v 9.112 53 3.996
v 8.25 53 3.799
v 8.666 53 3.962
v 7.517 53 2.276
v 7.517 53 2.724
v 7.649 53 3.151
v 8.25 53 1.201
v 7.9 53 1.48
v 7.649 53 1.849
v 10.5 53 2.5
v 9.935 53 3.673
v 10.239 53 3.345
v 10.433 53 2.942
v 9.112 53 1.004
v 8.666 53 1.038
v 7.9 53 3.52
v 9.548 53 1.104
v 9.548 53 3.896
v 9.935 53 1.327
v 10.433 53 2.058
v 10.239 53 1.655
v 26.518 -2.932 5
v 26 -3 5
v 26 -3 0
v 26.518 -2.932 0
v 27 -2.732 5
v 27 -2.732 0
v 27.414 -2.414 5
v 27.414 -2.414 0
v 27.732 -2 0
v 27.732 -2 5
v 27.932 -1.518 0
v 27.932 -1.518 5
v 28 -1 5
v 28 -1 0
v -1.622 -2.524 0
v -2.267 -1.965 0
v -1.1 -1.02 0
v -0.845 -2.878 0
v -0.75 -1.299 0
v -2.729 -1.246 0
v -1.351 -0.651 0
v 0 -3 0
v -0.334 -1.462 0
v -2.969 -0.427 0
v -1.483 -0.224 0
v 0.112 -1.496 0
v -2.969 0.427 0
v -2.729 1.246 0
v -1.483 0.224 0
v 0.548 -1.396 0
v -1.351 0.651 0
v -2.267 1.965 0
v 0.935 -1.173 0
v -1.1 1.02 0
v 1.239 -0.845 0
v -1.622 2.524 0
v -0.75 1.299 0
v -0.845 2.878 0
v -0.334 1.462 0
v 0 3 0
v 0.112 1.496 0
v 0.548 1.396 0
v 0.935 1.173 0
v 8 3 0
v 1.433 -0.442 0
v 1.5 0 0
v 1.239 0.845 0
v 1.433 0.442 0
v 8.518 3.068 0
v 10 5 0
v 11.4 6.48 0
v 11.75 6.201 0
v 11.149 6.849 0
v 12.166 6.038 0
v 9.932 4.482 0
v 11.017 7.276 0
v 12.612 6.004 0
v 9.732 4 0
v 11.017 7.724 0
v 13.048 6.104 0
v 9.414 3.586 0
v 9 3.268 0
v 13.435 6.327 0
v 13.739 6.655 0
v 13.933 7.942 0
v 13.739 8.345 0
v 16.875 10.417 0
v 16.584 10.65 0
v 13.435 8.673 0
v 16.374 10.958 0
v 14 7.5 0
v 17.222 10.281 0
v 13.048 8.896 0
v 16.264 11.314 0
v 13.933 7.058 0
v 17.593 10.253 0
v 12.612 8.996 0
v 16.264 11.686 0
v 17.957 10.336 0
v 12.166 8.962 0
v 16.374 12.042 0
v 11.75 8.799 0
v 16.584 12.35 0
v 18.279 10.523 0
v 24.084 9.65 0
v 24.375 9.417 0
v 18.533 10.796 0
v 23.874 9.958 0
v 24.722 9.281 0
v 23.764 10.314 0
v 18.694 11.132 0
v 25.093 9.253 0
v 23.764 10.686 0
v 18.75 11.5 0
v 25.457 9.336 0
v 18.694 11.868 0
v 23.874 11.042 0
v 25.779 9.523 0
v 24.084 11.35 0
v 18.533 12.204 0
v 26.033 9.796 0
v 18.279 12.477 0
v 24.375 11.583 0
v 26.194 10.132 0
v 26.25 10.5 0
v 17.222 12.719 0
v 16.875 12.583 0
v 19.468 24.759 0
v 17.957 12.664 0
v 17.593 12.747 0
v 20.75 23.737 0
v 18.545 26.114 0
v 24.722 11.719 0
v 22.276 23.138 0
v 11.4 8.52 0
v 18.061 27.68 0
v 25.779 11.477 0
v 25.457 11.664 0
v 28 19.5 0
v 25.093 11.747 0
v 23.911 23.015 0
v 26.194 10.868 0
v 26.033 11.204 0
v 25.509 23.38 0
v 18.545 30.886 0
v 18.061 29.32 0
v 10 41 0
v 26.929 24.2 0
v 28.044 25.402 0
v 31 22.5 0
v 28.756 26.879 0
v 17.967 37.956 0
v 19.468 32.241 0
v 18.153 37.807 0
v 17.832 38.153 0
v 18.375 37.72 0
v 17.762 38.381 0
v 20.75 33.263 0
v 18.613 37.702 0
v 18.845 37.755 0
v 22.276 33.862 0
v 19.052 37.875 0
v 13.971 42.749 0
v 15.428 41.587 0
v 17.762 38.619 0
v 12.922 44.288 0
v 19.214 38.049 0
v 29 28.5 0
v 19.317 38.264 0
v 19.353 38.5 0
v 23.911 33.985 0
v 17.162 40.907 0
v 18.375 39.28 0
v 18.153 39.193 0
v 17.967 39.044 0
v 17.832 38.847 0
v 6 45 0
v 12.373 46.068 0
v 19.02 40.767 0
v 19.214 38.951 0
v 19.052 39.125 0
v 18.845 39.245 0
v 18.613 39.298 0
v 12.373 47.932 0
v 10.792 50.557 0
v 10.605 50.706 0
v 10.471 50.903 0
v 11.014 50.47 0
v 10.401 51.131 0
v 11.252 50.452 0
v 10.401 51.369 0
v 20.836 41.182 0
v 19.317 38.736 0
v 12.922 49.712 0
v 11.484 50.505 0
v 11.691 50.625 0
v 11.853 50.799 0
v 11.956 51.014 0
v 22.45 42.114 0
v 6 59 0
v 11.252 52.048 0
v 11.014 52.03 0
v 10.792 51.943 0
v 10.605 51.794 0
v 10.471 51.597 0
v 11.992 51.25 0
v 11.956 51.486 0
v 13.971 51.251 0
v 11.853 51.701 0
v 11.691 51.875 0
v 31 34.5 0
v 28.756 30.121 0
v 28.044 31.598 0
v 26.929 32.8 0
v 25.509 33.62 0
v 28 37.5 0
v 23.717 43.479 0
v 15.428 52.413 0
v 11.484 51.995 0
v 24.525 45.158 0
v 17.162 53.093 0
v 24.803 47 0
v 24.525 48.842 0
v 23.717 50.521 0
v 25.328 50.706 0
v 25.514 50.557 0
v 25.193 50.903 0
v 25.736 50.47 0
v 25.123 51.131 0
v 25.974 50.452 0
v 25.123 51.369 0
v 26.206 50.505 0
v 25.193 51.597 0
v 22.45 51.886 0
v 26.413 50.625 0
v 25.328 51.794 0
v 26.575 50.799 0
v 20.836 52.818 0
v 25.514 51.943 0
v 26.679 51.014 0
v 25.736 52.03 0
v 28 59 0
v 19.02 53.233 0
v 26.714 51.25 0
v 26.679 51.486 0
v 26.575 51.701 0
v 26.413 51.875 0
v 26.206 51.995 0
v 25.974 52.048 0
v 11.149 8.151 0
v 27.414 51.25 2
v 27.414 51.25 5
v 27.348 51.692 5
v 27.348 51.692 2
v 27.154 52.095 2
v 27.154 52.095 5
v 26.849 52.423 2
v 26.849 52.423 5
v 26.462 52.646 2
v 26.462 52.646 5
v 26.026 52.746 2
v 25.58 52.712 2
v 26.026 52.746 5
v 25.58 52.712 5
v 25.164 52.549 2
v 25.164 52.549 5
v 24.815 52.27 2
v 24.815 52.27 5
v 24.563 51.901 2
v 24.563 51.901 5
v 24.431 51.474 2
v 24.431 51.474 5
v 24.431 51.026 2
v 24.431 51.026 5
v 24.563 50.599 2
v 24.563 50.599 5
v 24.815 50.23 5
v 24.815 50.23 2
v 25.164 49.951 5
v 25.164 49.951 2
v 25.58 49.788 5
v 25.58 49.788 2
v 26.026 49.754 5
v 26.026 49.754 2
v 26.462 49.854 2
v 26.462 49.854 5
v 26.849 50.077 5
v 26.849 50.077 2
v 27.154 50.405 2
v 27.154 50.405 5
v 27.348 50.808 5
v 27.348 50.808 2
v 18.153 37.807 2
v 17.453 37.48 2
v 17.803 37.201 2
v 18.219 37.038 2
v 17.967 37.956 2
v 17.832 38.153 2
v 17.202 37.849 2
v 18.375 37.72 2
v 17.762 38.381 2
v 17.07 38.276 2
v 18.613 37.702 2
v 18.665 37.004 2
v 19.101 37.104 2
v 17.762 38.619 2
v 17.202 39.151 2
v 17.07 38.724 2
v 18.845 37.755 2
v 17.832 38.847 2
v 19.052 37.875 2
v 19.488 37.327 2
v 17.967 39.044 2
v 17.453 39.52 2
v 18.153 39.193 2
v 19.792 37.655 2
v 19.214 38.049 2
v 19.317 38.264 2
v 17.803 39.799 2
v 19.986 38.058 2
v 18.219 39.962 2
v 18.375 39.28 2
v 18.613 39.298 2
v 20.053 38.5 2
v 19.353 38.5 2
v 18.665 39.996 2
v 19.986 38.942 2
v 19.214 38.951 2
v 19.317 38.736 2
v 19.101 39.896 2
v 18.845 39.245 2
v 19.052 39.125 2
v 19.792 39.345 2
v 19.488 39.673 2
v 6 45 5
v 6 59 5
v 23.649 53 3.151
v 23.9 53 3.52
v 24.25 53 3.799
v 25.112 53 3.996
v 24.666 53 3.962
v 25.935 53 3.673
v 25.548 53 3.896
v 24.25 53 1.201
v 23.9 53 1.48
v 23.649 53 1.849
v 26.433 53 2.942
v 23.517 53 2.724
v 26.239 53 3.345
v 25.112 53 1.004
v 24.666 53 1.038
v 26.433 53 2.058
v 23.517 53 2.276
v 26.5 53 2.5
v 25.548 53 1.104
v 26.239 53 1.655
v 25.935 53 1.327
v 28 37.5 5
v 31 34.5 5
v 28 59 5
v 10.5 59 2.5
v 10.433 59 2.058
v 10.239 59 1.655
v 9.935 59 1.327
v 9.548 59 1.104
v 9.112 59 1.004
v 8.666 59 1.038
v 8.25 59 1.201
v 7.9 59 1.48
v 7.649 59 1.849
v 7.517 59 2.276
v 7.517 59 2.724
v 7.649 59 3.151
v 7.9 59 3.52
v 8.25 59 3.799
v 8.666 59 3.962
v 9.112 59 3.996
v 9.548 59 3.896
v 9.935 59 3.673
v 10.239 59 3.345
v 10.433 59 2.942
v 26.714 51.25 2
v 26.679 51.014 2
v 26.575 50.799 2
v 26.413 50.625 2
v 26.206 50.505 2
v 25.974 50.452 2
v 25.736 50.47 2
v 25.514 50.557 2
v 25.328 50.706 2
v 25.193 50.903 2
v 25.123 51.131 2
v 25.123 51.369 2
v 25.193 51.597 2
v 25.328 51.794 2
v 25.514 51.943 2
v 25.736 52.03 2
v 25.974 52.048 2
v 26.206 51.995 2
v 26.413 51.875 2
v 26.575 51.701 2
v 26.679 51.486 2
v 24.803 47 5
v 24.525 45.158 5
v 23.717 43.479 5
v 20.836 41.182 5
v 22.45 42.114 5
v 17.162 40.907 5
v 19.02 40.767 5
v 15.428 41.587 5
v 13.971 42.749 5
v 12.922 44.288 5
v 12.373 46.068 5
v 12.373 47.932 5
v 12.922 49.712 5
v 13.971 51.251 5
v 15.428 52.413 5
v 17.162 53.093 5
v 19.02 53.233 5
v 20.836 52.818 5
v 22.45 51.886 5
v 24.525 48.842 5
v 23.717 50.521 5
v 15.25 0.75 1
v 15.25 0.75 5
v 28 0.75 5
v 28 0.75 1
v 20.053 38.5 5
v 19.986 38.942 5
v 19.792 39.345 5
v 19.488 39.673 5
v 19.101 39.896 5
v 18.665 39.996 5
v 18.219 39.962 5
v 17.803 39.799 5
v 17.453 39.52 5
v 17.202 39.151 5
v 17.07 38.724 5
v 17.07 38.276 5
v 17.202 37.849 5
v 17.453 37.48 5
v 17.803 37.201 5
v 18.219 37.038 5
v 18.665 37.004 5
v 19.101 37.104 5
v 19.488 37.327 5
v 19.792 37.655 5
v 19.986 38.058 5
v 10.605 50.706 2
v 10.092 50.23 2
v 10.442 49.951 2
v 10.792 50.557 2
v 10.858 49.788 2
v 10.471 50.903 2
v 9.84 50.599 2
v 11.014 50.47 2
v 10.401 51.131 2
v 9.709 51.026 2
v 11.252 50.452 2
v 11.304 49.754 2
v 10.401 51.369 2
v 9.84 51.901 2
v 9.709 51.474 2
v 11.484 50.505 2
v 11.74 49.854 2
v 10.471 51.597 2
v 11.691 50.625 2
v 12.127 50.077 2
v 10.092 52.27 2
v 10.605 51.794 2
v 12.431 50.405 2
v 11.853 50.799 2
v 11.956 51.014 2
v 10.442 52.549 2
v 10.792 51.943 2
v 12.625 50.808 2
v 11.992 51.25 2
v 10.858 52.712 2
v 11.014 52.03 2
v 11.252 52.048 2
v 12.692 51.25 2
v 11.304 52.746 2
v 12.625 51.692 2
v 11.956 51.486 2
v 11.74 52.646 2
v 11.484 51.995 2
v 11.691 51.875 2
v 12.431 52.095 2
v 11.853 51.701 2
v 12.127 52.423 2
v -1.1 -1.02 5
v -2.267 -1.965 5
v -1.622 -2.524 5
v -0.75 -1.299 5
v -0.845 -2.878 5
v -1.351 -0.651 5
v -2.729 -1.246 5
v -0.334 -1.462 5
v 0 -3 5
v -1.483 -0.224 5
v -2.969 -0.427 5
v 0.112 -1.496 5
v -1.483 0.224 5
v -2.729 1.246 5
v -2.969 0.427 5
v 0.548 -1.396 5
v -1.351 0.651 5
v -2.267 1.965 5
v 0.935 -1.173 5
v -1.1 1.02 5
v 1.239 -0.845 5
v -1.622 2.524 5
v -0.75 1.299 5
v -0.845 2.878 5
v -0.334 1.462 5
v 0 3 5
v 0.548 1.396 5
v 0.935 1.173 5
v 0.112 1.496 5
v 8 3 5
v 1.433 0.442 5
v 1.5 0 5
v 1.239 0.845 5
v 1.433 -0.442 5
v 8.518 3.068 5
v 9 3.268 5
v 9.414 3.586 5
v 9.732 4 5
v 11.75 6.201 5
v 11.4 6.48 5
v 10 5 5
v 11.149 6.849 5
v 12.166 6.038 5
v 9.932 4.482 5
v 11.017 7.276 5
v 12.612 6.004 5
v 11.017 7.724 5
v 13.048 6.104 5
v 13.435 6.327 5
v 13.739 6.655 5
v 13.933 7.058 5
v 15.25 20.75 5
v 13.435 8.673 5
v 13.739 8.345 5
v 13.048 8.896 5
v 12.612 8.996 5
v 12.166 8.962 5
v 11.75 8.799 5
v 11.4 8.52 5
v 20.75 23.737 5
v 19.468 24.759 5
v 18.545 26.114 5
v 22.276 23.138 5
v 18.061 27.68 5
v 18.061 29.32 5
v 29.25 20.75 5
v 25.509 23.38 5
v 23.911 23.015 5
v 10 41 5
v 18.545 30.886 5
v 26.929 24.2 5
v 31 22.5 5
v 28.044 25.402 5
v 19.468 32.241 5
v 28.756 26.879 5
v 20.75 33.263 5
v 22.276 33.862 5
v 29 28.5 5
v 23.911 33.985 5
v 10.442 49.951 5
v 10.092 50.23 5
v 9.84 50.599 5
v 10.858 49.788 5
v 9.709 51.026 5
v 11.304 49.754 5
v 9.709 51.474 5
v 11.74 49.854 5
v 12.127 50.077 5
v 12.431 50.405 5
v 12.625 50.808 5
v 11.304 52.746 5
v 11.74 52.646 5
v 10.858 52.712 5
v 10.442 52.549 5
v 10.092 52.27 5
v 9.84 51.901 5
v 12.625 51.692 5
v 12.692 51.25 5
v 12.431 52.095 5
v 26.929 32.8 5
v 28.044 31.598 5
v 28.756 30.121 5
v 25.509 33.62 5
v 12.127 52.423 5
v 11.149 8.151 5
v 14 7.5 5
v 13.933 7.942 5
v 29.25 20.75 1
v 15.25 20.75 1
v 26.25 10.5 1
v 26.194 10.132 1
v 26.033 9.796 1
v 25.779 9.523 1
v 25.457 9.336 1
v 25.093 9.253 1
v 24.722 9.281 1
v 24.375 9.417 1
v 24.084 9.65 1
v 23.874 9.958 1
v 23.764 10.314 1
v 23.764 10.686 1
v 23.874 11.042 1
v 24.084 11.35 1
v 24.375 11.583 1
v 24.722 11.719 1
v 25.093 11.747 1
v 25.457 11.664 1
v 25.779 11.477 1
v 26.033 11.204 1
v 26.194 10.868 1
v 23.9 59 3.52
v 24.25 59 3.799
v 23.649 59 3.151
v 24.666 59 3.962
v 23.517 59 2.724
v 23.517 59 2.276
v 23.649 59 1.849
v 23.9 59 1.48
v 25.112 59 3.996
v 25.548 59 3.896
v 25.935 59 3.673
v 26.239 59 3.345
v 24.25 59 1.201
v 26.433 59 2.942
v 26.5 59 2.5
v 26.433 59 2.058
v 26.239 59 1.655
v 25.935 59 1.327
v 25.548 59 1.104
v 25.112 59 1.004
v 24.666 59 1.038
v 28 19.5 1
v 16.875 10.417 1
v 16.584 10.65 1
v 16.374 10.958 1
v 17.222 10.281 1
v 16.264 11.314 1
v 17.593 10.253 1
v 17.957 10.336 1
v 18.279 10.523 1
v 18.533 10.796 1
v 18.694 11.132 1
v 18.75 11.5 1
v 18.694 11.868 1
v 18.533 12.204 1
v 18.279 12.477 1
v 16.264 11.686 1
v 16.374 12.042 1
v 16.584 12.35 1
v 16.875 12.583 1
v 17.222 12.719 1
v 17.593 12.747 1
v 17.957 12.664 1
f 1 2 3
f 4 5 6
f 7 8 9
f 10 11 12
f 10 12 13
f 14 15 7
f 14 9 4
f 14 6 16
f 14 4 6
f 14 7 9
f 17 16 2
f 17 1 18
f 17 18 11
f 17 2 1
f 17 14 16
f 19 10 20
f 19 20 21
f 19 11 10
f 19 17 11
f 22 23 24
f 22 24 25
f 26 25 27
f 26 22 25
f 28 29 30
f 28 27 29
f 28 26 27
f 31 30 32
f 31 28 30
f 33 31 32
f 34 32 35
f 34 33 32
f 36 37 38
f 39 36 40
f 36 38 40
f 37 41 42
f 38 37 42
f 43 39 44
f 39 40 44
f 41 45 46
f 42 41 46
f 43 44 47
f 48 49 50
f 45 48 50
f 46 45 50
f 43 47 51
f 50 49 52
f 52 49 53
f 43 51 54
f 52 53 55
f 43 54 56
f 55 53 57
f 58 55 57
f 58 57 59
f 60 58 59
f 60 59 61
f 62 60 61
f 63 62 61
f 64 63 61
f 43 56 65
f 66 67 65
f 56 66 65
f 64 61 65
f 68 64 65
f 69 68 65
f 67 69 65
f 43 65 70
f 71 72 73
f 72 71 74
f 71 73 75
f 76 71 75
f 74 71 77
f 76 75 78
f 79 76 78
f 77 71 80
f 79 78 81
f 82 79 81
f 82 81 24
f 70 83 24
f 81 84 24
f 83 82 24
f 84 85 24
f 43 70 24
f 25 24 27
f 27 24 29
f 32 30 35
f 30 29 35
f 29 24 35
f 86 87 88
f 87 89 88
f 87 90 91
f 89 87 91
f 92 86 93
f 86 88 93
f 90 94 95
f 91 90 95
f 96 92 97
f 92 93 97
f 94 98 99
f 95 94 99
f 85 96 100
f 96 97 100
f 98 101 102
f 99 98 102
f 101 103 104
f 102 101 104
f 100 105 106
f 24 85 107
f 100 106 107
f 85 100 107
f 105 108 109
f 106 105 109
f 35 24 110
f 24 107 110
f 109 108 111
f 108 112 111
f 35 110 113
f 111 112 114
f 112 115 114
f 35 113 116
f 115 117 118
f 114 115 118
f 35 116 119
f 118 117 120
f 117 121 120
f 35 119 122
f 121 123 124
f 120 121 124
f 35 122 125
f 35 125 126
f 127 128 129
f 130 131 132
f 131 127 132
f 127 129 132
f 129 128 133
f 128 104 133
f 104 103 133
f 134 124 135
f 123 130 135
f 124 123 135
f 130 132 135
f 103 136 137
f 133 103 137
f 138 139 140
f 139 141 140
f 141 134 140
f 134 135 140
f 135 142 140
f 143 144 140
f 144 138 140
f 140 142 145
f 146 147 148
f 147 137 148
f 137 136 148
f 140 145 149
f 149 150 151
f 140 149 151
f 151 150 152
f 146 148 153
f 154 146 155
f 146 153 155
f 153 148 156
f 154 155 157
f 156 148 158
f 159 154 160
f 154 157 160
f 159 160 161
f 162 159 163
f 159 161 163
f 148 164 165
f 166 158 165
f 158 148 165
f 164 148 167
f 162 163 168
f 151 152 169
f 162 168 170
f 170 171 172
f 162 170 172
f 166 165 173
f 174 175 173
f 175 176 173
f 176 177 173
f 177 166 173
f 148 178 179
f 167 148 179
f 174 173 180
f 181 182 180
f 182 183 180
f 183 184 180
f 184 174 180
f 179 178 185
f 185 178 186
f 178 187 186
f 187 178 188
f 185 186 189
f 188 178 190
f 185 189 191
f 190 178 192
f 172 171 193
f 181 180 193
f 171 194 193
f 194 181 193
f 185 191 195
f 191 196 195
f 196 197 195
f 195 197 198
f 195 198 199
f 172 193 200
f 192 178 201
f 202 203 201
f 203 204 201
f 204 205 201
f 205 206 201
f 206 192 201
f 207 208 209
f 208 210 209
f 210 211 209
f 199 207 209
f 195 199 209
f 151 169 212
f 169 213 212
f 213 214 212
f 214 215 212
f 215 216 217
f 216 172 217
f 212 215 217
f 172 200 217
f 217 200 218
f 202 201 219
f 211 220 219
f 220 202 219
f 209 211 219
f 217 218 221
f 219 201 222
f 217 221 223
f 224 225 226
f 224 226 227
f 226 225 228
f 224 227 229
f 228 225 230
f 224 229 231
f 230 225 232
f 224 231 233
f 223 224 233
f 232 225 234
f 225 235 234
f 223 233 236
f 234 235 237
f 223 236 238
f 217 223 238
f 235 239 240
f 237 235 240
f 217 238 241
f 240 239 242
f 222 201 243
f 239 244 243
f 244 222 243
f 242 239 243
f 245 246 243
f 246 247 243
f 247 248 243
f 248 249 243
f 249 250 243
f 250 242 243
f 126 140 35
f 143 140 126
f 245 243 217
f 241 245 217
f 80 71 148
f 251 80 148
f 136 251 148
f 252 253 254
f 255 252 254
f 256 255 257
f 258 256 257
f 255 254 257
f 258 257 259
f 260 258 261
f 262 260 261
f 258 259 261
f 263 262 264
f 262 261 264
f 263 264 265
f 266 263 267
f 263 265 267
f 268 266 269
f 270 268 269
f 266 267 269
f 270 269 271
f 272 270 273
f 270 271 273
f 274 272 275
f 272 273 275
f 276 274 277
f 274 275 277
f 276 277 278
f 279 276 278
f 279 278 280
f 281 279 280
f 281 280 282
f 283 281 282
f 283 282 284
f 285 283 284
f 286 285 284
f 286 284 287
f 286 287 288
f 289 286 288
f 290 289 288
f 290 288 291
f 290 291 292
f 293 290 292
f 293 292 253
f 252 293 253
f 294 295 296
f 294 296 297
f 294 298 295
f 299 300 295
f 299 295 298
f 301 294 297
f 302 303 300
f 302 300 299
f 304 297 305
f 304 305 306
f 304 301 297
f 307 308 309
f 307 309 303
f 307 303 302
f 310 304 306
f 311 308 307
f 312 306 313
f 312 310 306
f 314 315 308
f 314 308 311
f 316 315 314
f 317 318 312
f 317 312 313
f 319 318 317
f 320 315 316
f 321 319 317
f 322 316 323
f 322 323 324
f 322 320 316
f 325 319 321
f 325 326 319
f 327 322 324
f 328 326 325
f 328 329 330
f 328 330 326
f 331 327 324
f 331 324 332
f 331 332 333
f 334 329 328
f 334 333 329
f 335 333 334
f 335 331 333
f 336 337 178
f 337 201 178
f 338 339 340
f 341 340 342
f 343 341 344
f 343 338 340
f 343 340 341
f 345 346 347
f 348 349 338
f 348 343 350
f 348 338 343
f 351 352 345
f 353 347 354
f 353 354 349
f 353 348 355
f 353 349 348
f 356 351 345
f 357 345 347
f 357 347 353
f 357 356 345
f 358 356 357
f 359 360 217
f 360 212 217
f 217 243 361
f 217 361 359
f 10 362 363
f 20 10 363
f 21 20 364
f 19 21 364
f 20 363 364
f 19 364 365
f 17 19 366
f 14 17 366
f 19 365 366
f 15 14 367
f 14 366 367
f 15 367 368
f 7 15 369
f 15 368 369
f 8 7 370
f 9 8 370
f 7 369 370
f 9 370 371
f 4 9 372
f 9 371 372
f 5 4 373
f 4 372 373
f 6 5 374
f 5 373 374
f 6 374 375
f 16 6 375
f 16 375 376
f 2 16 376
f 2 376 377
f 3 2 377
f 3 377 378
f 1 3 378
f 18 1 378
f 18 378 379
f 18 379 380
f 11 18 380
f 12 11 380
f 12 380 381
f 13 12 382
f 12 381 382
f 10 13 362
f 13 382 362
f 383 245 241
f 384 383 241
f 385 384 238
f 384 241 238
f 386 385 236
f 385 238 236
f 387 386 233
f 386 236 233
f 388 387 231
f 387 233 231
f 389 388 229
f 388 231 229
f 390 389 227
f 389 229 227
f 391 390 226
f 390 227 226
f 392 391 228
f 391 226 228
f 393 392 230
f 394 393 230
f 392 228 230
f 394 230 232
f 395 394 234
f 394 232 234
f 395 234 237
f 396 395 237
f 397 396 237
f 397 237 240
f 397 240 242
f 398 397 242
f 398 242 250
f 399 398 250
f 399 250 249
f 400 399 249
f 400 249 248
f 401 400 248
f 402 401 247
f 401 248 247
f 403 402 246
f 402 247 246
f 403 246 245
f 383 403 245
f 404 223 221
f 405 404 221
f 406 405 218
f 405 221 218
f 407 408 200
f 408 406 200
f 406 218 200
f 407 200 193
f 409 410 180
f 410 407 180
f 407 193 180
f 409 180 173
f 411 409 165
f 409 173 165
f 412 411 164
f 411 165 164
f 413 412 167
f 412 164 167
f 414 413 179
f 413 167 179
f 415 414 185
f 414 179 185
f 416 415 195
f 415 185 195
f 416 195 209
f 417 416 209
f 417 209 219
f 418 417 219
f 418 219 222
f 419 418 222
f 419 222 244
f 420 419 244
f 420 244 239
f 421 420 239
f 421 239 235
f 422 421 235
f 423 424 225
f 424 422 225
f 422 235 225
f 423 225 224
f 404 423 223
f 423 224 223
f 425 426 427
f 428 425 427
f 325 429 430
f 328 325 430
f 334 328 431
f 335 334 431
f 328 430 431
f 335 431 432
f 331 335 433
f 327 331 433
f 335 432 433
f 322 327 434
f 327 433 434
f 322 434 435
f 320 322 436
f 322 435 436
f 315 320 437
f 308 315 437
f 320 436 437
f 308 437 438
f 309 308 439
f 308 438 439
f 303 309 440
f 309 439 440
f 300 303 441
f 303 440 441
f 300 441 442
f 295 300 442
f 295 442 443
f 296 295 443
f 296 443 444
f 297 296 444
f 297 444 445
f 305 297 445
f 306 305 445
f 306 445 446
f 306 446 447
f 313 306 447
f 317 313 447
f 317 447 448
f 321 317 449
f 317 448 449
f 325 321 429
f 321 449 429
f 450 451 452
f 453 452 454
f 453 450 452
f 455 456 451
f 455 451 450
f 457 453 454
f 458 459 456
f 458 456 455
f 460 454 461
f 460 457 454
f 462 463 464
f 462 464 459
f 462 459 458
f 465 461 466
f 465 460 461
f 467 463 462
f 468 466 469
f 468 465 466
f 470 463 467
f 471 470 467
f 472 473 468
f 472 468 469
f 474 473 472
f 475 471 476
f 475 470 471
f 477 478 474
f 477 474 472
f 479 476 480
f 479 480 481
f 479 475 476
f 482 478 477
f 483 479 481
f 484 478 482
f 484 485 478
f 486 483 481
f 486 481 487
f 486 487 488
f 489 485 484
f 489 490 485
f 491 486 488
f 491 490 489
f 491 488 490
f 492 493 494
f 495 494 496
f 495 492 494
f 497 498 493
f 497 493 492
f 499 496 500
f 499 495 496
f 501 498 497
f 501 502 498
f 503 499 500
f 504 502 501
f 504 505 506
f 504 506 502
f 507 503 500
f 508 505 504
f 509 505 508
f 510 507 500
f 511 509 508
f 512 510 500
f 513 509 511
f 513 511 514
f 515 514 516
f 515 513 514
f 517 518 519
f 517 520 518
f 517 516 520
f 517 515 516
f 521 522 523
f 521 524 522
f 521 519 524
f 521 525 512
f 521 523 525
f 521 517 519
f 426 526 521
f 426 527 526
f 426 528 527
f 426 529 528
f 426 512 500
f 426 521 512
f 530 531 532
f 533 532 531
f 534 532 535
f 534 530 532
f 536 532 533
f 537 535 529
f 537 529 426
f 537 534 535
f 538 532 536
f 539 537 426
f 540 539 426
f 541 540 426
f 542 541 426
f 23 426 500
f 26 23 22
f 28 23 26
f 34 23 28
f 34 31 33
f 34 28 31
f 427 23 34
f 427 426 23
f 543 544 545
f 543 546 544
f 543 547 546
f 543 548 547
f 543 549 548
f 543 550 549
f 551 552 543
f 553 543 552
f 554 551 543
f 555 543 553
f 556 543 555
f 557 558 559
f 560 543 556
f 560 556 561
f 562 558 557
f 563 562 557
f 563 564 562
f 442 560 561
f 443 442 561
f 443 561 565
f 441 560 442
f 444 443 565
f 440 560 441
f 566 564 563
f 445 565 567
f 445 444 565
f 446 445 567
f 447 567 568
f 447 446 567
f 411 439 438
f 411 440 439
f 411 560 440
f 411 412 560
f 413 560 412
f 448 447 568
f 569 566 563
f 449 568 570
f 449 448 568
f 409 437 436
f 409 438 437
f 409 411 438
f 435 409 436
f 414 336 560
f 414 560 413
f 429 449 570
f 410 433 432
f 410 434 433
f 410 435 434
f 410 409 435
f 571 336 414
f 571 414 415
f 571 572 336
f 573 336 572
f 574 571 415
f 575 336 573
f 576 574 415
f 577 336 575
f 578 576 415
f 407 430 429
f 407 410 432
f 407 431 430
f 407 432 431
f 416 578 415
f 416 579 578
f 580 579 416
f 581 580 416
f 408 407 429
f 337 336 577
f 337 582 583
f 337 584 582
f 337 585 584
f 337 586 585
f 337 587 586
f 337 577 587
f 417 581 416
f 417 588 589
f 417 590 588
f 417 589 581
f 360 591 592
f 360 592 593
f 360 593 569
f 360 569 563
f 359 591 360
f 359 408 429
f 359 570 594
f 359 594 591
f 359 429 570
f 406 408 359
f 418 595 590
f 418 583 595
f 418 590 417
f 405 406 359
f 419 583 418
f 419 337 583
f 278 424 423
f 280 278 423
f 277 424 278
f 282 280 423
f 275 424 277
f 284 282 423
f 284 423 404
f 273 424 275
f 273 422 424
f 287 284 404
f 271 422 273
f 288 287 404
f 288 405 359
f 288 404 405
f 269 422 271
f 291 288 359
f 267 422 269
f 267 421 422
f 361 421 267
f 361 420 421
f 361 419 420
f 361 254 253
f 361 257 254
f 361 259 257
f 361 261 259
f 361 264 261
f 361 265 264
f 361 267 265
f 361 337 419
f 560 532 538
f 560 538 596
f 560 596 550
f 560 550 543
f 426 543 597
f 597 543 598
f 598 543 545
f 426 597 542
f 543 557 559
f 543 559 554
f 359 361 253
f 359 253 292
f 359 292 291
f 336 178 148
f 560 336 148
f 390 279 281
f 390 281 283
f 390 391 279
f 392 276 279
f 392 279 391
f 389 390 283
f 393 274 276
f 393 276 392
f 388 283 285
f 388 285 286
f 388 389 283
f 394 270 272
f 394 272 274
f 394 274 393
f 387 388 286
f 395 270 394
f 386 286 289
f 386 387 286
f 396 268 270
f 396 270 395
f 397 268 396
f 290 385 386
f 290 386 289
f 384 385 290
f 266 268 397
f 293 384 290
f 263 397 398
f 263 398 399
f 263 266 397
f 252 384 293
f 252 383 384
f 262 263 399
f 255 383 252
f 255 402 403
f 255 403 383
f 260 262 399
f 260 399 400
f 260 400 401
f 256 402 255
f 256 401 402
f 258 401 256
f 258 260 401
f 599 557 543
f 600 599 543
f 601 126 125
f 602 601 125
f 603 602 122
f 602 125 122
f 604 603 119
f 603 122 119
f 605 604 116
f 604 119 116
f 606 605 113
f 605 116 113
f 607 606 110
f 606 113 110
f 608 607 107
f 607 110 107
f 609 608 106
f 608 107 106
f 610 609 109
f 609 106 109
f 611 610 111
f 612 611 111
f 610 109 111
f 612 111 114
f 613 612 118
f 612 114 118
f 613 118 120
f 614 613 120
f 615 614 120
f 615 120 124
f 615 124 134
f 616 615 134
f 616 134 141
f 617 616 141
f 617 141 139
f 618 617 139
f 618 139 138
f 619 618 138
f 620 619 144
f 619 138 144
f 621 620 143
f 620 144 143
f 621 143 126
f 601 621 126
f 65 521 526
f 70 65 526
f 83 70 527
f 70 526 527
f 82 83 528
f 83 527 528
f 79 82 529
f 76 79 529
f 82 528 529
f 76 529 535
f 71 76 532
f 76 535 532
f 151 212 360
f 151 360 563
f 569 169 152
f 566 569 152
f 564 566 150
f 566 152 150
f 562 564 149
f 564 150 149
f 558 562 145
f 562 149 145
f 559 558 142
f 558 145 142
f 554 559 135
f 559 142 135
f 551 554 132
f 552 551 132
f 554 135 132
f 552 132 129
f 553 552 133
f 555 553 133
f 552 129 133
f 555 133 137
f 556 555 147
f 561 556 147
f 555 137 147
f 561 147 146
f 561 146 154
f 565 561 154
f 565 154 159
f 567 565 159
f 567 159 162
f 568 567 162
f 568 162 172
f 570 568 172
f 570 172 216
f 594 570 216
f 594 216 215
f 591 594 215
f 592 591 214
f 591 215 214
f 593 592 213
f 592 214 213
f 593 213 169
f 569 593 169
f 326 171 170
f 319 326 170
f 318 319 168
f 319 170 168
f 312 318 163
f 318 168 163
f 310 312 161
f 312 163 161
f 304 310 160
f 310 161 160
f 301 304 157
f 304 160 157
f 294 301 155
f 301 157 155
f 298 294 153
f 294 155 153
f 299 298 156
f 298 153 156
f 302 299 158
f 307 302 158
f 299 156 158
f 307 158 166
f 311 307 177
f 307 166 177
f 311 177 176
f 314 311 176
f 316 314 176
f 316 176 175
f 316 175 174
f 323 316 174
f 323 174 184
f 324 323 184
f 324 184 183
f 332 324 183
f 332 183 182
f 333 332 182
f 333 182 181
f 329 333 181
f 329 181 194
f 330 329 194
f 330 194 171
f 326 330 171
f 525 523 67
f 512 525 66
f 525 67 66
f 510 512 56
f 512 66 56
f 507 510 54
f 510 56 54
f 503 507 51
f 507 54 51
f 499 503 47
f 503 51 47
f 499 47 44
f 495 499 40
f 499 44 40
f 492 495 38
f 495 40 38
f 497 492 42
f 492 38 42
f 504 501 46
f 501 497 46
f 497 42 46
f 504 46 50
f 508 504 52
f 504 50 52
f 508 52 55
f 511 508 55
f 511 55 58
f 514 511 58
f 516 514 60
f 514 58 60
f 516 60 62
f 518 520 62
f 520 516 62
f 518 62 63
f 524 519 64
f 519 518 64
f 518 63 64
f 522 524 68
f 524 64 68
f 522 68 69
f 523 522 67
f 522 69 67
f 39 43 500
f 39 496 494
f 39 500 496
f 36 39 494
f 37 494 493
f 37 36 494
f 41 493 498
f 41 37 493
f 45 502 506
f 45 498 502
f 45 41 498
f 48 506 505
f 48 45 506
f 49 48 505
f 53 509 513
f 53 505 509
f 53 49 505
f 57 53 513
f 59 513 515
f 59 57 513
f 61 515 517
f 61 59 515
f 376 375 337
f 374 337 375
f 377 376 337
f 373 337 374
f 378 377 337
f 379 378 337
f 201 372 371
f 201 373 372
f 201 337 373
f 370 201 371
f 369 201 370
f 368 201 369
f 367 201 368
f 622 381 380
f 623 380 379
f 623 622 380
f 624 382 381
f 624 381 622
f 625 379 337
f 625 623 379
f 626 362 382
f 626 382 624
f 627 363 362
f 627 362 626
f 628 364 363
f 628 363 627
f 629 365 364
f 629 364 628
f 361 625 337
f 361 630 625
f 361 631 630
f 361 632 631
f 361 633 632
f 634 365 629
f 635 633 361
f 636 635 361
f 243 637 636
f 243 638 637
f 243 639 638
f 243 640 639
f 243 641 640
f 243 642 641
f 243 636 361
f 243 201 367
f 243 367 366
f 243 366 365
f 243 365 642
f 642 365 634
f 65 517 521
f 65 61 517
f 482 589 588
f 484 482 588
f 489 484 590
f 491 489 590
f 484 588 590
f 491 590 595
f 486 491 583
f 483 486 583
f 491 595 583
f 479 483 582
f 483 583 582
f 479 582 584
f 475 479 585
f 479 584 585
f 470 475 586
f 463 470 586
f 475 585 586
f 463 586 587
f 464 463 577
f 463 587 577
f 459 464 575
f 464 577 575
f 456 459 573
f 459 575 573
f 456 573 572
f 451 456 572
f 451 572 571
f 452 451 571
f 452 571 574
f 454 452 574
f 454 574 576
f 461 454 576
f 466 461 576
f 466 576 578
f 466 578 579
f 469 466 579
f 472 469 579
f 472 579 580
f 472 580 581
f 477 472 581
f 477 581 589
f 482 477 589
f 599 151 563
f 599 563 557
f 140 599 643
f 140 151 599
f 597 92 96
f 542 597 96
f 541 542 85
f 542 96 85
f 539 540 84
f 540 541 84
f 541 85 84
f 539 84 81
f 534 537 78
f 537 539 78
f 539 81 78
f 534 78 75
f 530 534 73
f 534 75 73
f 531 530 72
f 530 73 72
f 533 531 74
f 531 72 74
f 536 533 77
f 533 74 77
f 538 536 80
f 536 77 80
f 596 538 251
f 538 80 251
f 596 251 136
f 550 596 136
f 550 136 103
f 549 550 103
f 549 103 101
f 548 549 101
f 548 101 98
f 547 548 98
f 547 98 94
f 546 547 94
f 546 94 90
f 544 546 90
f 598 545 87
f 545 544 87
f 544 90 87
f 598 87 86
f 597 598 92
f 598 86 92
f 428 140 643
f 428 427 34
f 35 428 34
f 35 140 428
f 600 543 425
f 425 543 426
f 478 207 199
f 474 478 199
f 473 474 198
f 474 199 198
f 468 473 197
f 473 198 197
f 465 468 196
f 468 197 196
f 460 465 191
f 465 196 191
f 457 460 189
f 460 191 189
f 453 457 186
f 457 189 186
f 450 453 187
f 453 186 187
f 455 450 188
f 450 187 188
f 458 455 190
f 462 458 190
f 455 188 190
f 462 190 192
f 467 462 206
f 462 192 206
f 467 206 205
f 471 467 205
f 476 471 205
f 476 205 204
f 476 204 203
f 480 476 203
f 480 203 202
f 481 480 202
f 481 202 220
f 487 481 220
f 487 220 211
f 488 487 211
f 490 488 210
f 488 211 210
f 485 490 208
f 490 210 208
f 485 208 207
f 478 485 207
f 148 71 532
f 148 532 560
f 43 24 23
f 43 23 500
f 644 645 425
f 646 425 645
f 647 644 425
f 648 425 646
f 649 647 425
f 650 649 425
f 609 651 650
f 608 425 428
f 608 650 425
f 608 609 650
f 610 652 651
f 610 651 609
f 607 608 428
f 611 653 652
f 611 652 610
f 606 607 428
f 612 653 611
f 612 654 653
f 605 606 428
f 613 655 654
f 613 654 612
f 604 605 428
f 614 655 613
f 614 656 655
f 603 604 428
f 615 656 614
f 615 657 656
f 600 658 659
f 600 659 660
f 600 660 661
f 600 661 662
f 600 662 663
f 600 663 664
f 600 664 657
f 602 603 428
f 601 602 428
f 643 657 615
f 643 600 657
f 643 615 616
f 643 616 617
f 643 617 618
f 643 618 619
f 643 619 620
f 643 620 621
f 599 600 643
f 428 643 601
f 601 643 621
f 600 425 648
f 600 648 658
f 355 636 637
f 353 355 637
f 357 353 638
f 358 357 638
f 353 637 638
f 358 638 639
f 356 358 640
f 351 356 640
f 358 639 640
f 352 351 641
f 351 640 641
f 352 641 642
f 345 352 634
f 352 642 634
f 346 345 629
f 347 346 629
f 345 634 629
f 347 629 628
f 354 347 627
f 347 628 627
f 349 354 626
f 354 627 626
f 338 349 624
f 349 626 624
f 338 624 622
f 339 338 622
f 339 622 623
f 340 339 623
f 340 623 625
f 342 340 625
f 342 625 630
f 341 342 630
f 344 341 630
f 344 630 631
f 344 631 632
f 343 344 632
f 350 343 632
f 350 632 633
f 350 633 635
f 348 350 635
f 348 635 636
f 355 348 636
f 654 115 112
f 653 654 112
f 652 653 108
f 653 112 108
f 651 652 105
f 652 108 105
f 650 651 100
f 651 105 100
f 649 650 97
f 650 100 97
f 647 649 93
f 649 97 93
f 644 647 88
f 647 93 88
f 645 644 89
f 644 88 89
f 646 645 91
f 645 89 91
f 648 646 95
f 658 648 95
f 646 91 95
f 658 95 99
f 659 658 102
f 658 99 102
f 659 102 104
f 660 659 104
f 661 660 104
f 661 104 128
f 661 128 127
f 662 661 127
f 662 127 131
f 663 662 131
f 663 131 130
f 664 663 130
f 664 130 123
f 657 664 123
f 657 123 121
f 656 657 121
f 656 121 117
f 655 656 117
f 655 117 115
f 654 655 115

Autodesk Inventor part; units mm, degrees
ref_plane "YZ Plane" through (0, 0, 0) normal (1, 0, 0) x (0, 1, 0)
ref_plane "XZ Plane" through (0, 0, 0) normal (0, 1, 0) x (-1, 0, 0)
ref_plane "XY Plane" through (0, 0, 0) normal (0, 0, 1) x (1, 0, 0)
sketch "Sketch1" plane through (0, 0, 0) normal (0, 0, 1) x (1, 0, 0)
  circle A0 centre (0, 0) radius 1.5
  circle A1 centre (0, 0) radius 3
  line L0 (0, 3) -> (28, 3)
  line L1 (28, 3) -> (28, -3)
  line L2 (28, -3) -> (0, -3)
  line L3 (0, -3) -> (0, 3)
  line L4 (28, 3) -> (10, 3)
  line L5 (10, 3) -> (10, 59)
  line L6 (10, 59) -> (28, 59)
  line L7 (28, 59) -> (28, 3)
  circle A2 centre (23.5, 28.5) radius 5.5
  circle A3 centre (18.553, 47) radius 6.25
  line L8 (23.5, 28.5) -> (18.553, 47) construction
  line L9 (23.5, 28.5) -> (10, 28.5) construction
  circle A4 centre (18.553, 38.5) radius 0.8
  circle A5 centre (25.9142, 51.25) radius 0.8
  circle A6 centre (11.1918, 51.25) radius 0.8
  line L10 (10, 59) -> (6, 59)
  line L11 (6, 59) -> (6, 45)
  line L12 (6, 45) -> (10, 45)
  line L13 (10, 45) -> (10, 59)
  line L14 (6, 45) -> (10, 41)
  line L15 (6, 45) -> (11.6569, 45) construction
  line L16 (28, 34.5) -> (31, 34.5)
  line L17 (31, 34.5) -> (31, 22.5)
  line L18 (31, 22.5) -> (28, 22.5)
  line L19 (28, 22.5) -> (28, 34.5)
  line L20 (31, 34.5) -> (28, 37.5)
  line L21 (31, 34.5) -> (35.2426, 34.5) construction
  line L22 (31, 22.5) -> (28, 19.5)
  line L23 (31, 22.5) -> (35.2426, 22.5) construction
  circle A7 centre (12.5, 7.5) radius 1.5
  circle A8 centre (17.5, 11.5) radius 1.25
  circle A9 centre (25, 10.5) radius 1.25
  line L24 (18.553, 47) -> (6, 47) construction
  line L25 (18.553, 38.5) -> (18.553, 47) construction
  dimension "d0" = 3
  dimension "d1" = 6
  dimension "d2" = 28
  dimension "d3" = 6
  dimension "d4" = 0
  dimension "d5" = 3
  dimension "d6" = 18
  dimension "d7" = 56
  dimension "d8" = 11
  dimension "d9" = 4.5
  dimension "d10" = 25.5
  dimension "d11" = 12.5
  dimension "d12" = 19.15
  dimension "d14" = 1.6
  dimension "d17" = 12
  dimension "d20" = 360
  dimension "d22" = 4
  dimension "d23" = 14
  dimension "d24" = 45
  dimension "d25" = 3
  dimension "d26" = 12
  dimension "d27" = 6
  dimension "d28" = 135
  dimension "d29" = 135
  dimension "d32" = 3
  dimension "d33" = 10.5
  dimension "d34" = 2.5
  dimension "d35" = 2.5
  dimension "d36" = 14.5
  dimension "d37" = 7.5
  dimension "d38" = 2.5
  dimension "d39" = 15
  dimension "d40" = 13.5
  dimension "d60" = 8.5
  dimension "d61" = 270
extrude "Extrusion1" add sketch "Sketch1" along normal blind 5 contours A0 L3 A1 | A0 L3 A1 | L0 L1 L2 A1 | L5 L6 L7 A2 L0 | L14 L12 L5 | L7 L18 L22 | L12 L11 L10 L5 | L7 A2 L16 L17 L18 | L16 L7 L20
fillet "Fillet1" radius 2 1 edges at (28, -3, 2.5)
fillet "Fillet2" radius 2 1 edges at (10, 3, 2.5)
sketch "Sketch2" plane through (0, 0, 5) normal (0, 0, 1) x (1, 0, 0)
  line L0 (28, -1) -> (28, 19.5) projected
  line L1 (0, -3) -> (26, -3) projected
  line L2 (28, -1) -> (28, 19.5) projected
  line L3 (28, 20.75) -> (15.25, 20.75)
  line L4 (15.25, 20.75) -> (15.25, 0.75)
  line L5 (15.25, 0.75) -> (28, 0.75)
  line L6 (28, 0.75) -> (28, 20.75)
  line L7 (28, 19.5) -> (31, 22.5) projected
  line L8 (28, 20.75) -> (29.25, 20.75)
  line L9 (28, 19.5) -> (31, 22.5) projected
  point P0 (0, 0)
  point P1 (28, 19.5)
  point P2 (28, 19.5)
  dimension "d43" = 12.75
  dimension "d44" = 20
  dimension "d45" = 23.75
extrude "Extrusion2" cut sketch "Sketch2" against normal blind 4
sketch "Sketch3" plane through (6, 59, 0) normal (0, 1, 0) x (1, 0, 0)
  circle A0 centre (3, -2.5) radius 1.5
  line L0 (22, 0) -> (0, 0) projected
  line L1 (0, 0) -> (0, -5) projected
  line L2 (22, -5) -> (0, -5) projected
  line L3 (22, 0) -> (22, -5) projected
  circle A1 centre (19, -2.5) radius 1.5
  dimension "d48" = 3
  dimension "d49" = 3
  dimension "d50" = 2.5
  dimension "d51" = 2.5
  dimension "d52" = 3
  dimension "d53" = 3
extrude "Extrusion3" cut sketch "Sketch3" against normal blind 6 contours A0 | A1
thread "Thread1" size "M3x0.5" class "6H" standard "ANSI Metric M Profile" length 7
thread "Thread2" size "M3x0.5" class "6H" standard "ANSI Metric M Profile" length 7
sketch "Sketch5" plane through (0, 0, 5) normal (0, 0, 1) x (1, 0, 0)
  circle A0 centre (18.553, 38.5) radius 0.8 projected
  circle A1 centre (11.1918, 51.25) radius 0.8 projected
  circle A2 centre (25.9142, 51.25) radius 0.8 projected
  circle A3 centre (18.553, 38.5) radius 1.5
  circle A4 centre (11.1918, 51.25) radius 1.5
  circle A5 centre (25.9142, 51.25) radius 1.5
  point P0 (0, 0)
  dimension "d62" = 3
  dimension "d63" = 3
  dimension "d64" = 3
extrude "Extrusion4" cut sketch "Sketch5" against normal blind 3 contours A0 | A1 | A2 | A3 | A4 | A5
properties part number "PartA"
